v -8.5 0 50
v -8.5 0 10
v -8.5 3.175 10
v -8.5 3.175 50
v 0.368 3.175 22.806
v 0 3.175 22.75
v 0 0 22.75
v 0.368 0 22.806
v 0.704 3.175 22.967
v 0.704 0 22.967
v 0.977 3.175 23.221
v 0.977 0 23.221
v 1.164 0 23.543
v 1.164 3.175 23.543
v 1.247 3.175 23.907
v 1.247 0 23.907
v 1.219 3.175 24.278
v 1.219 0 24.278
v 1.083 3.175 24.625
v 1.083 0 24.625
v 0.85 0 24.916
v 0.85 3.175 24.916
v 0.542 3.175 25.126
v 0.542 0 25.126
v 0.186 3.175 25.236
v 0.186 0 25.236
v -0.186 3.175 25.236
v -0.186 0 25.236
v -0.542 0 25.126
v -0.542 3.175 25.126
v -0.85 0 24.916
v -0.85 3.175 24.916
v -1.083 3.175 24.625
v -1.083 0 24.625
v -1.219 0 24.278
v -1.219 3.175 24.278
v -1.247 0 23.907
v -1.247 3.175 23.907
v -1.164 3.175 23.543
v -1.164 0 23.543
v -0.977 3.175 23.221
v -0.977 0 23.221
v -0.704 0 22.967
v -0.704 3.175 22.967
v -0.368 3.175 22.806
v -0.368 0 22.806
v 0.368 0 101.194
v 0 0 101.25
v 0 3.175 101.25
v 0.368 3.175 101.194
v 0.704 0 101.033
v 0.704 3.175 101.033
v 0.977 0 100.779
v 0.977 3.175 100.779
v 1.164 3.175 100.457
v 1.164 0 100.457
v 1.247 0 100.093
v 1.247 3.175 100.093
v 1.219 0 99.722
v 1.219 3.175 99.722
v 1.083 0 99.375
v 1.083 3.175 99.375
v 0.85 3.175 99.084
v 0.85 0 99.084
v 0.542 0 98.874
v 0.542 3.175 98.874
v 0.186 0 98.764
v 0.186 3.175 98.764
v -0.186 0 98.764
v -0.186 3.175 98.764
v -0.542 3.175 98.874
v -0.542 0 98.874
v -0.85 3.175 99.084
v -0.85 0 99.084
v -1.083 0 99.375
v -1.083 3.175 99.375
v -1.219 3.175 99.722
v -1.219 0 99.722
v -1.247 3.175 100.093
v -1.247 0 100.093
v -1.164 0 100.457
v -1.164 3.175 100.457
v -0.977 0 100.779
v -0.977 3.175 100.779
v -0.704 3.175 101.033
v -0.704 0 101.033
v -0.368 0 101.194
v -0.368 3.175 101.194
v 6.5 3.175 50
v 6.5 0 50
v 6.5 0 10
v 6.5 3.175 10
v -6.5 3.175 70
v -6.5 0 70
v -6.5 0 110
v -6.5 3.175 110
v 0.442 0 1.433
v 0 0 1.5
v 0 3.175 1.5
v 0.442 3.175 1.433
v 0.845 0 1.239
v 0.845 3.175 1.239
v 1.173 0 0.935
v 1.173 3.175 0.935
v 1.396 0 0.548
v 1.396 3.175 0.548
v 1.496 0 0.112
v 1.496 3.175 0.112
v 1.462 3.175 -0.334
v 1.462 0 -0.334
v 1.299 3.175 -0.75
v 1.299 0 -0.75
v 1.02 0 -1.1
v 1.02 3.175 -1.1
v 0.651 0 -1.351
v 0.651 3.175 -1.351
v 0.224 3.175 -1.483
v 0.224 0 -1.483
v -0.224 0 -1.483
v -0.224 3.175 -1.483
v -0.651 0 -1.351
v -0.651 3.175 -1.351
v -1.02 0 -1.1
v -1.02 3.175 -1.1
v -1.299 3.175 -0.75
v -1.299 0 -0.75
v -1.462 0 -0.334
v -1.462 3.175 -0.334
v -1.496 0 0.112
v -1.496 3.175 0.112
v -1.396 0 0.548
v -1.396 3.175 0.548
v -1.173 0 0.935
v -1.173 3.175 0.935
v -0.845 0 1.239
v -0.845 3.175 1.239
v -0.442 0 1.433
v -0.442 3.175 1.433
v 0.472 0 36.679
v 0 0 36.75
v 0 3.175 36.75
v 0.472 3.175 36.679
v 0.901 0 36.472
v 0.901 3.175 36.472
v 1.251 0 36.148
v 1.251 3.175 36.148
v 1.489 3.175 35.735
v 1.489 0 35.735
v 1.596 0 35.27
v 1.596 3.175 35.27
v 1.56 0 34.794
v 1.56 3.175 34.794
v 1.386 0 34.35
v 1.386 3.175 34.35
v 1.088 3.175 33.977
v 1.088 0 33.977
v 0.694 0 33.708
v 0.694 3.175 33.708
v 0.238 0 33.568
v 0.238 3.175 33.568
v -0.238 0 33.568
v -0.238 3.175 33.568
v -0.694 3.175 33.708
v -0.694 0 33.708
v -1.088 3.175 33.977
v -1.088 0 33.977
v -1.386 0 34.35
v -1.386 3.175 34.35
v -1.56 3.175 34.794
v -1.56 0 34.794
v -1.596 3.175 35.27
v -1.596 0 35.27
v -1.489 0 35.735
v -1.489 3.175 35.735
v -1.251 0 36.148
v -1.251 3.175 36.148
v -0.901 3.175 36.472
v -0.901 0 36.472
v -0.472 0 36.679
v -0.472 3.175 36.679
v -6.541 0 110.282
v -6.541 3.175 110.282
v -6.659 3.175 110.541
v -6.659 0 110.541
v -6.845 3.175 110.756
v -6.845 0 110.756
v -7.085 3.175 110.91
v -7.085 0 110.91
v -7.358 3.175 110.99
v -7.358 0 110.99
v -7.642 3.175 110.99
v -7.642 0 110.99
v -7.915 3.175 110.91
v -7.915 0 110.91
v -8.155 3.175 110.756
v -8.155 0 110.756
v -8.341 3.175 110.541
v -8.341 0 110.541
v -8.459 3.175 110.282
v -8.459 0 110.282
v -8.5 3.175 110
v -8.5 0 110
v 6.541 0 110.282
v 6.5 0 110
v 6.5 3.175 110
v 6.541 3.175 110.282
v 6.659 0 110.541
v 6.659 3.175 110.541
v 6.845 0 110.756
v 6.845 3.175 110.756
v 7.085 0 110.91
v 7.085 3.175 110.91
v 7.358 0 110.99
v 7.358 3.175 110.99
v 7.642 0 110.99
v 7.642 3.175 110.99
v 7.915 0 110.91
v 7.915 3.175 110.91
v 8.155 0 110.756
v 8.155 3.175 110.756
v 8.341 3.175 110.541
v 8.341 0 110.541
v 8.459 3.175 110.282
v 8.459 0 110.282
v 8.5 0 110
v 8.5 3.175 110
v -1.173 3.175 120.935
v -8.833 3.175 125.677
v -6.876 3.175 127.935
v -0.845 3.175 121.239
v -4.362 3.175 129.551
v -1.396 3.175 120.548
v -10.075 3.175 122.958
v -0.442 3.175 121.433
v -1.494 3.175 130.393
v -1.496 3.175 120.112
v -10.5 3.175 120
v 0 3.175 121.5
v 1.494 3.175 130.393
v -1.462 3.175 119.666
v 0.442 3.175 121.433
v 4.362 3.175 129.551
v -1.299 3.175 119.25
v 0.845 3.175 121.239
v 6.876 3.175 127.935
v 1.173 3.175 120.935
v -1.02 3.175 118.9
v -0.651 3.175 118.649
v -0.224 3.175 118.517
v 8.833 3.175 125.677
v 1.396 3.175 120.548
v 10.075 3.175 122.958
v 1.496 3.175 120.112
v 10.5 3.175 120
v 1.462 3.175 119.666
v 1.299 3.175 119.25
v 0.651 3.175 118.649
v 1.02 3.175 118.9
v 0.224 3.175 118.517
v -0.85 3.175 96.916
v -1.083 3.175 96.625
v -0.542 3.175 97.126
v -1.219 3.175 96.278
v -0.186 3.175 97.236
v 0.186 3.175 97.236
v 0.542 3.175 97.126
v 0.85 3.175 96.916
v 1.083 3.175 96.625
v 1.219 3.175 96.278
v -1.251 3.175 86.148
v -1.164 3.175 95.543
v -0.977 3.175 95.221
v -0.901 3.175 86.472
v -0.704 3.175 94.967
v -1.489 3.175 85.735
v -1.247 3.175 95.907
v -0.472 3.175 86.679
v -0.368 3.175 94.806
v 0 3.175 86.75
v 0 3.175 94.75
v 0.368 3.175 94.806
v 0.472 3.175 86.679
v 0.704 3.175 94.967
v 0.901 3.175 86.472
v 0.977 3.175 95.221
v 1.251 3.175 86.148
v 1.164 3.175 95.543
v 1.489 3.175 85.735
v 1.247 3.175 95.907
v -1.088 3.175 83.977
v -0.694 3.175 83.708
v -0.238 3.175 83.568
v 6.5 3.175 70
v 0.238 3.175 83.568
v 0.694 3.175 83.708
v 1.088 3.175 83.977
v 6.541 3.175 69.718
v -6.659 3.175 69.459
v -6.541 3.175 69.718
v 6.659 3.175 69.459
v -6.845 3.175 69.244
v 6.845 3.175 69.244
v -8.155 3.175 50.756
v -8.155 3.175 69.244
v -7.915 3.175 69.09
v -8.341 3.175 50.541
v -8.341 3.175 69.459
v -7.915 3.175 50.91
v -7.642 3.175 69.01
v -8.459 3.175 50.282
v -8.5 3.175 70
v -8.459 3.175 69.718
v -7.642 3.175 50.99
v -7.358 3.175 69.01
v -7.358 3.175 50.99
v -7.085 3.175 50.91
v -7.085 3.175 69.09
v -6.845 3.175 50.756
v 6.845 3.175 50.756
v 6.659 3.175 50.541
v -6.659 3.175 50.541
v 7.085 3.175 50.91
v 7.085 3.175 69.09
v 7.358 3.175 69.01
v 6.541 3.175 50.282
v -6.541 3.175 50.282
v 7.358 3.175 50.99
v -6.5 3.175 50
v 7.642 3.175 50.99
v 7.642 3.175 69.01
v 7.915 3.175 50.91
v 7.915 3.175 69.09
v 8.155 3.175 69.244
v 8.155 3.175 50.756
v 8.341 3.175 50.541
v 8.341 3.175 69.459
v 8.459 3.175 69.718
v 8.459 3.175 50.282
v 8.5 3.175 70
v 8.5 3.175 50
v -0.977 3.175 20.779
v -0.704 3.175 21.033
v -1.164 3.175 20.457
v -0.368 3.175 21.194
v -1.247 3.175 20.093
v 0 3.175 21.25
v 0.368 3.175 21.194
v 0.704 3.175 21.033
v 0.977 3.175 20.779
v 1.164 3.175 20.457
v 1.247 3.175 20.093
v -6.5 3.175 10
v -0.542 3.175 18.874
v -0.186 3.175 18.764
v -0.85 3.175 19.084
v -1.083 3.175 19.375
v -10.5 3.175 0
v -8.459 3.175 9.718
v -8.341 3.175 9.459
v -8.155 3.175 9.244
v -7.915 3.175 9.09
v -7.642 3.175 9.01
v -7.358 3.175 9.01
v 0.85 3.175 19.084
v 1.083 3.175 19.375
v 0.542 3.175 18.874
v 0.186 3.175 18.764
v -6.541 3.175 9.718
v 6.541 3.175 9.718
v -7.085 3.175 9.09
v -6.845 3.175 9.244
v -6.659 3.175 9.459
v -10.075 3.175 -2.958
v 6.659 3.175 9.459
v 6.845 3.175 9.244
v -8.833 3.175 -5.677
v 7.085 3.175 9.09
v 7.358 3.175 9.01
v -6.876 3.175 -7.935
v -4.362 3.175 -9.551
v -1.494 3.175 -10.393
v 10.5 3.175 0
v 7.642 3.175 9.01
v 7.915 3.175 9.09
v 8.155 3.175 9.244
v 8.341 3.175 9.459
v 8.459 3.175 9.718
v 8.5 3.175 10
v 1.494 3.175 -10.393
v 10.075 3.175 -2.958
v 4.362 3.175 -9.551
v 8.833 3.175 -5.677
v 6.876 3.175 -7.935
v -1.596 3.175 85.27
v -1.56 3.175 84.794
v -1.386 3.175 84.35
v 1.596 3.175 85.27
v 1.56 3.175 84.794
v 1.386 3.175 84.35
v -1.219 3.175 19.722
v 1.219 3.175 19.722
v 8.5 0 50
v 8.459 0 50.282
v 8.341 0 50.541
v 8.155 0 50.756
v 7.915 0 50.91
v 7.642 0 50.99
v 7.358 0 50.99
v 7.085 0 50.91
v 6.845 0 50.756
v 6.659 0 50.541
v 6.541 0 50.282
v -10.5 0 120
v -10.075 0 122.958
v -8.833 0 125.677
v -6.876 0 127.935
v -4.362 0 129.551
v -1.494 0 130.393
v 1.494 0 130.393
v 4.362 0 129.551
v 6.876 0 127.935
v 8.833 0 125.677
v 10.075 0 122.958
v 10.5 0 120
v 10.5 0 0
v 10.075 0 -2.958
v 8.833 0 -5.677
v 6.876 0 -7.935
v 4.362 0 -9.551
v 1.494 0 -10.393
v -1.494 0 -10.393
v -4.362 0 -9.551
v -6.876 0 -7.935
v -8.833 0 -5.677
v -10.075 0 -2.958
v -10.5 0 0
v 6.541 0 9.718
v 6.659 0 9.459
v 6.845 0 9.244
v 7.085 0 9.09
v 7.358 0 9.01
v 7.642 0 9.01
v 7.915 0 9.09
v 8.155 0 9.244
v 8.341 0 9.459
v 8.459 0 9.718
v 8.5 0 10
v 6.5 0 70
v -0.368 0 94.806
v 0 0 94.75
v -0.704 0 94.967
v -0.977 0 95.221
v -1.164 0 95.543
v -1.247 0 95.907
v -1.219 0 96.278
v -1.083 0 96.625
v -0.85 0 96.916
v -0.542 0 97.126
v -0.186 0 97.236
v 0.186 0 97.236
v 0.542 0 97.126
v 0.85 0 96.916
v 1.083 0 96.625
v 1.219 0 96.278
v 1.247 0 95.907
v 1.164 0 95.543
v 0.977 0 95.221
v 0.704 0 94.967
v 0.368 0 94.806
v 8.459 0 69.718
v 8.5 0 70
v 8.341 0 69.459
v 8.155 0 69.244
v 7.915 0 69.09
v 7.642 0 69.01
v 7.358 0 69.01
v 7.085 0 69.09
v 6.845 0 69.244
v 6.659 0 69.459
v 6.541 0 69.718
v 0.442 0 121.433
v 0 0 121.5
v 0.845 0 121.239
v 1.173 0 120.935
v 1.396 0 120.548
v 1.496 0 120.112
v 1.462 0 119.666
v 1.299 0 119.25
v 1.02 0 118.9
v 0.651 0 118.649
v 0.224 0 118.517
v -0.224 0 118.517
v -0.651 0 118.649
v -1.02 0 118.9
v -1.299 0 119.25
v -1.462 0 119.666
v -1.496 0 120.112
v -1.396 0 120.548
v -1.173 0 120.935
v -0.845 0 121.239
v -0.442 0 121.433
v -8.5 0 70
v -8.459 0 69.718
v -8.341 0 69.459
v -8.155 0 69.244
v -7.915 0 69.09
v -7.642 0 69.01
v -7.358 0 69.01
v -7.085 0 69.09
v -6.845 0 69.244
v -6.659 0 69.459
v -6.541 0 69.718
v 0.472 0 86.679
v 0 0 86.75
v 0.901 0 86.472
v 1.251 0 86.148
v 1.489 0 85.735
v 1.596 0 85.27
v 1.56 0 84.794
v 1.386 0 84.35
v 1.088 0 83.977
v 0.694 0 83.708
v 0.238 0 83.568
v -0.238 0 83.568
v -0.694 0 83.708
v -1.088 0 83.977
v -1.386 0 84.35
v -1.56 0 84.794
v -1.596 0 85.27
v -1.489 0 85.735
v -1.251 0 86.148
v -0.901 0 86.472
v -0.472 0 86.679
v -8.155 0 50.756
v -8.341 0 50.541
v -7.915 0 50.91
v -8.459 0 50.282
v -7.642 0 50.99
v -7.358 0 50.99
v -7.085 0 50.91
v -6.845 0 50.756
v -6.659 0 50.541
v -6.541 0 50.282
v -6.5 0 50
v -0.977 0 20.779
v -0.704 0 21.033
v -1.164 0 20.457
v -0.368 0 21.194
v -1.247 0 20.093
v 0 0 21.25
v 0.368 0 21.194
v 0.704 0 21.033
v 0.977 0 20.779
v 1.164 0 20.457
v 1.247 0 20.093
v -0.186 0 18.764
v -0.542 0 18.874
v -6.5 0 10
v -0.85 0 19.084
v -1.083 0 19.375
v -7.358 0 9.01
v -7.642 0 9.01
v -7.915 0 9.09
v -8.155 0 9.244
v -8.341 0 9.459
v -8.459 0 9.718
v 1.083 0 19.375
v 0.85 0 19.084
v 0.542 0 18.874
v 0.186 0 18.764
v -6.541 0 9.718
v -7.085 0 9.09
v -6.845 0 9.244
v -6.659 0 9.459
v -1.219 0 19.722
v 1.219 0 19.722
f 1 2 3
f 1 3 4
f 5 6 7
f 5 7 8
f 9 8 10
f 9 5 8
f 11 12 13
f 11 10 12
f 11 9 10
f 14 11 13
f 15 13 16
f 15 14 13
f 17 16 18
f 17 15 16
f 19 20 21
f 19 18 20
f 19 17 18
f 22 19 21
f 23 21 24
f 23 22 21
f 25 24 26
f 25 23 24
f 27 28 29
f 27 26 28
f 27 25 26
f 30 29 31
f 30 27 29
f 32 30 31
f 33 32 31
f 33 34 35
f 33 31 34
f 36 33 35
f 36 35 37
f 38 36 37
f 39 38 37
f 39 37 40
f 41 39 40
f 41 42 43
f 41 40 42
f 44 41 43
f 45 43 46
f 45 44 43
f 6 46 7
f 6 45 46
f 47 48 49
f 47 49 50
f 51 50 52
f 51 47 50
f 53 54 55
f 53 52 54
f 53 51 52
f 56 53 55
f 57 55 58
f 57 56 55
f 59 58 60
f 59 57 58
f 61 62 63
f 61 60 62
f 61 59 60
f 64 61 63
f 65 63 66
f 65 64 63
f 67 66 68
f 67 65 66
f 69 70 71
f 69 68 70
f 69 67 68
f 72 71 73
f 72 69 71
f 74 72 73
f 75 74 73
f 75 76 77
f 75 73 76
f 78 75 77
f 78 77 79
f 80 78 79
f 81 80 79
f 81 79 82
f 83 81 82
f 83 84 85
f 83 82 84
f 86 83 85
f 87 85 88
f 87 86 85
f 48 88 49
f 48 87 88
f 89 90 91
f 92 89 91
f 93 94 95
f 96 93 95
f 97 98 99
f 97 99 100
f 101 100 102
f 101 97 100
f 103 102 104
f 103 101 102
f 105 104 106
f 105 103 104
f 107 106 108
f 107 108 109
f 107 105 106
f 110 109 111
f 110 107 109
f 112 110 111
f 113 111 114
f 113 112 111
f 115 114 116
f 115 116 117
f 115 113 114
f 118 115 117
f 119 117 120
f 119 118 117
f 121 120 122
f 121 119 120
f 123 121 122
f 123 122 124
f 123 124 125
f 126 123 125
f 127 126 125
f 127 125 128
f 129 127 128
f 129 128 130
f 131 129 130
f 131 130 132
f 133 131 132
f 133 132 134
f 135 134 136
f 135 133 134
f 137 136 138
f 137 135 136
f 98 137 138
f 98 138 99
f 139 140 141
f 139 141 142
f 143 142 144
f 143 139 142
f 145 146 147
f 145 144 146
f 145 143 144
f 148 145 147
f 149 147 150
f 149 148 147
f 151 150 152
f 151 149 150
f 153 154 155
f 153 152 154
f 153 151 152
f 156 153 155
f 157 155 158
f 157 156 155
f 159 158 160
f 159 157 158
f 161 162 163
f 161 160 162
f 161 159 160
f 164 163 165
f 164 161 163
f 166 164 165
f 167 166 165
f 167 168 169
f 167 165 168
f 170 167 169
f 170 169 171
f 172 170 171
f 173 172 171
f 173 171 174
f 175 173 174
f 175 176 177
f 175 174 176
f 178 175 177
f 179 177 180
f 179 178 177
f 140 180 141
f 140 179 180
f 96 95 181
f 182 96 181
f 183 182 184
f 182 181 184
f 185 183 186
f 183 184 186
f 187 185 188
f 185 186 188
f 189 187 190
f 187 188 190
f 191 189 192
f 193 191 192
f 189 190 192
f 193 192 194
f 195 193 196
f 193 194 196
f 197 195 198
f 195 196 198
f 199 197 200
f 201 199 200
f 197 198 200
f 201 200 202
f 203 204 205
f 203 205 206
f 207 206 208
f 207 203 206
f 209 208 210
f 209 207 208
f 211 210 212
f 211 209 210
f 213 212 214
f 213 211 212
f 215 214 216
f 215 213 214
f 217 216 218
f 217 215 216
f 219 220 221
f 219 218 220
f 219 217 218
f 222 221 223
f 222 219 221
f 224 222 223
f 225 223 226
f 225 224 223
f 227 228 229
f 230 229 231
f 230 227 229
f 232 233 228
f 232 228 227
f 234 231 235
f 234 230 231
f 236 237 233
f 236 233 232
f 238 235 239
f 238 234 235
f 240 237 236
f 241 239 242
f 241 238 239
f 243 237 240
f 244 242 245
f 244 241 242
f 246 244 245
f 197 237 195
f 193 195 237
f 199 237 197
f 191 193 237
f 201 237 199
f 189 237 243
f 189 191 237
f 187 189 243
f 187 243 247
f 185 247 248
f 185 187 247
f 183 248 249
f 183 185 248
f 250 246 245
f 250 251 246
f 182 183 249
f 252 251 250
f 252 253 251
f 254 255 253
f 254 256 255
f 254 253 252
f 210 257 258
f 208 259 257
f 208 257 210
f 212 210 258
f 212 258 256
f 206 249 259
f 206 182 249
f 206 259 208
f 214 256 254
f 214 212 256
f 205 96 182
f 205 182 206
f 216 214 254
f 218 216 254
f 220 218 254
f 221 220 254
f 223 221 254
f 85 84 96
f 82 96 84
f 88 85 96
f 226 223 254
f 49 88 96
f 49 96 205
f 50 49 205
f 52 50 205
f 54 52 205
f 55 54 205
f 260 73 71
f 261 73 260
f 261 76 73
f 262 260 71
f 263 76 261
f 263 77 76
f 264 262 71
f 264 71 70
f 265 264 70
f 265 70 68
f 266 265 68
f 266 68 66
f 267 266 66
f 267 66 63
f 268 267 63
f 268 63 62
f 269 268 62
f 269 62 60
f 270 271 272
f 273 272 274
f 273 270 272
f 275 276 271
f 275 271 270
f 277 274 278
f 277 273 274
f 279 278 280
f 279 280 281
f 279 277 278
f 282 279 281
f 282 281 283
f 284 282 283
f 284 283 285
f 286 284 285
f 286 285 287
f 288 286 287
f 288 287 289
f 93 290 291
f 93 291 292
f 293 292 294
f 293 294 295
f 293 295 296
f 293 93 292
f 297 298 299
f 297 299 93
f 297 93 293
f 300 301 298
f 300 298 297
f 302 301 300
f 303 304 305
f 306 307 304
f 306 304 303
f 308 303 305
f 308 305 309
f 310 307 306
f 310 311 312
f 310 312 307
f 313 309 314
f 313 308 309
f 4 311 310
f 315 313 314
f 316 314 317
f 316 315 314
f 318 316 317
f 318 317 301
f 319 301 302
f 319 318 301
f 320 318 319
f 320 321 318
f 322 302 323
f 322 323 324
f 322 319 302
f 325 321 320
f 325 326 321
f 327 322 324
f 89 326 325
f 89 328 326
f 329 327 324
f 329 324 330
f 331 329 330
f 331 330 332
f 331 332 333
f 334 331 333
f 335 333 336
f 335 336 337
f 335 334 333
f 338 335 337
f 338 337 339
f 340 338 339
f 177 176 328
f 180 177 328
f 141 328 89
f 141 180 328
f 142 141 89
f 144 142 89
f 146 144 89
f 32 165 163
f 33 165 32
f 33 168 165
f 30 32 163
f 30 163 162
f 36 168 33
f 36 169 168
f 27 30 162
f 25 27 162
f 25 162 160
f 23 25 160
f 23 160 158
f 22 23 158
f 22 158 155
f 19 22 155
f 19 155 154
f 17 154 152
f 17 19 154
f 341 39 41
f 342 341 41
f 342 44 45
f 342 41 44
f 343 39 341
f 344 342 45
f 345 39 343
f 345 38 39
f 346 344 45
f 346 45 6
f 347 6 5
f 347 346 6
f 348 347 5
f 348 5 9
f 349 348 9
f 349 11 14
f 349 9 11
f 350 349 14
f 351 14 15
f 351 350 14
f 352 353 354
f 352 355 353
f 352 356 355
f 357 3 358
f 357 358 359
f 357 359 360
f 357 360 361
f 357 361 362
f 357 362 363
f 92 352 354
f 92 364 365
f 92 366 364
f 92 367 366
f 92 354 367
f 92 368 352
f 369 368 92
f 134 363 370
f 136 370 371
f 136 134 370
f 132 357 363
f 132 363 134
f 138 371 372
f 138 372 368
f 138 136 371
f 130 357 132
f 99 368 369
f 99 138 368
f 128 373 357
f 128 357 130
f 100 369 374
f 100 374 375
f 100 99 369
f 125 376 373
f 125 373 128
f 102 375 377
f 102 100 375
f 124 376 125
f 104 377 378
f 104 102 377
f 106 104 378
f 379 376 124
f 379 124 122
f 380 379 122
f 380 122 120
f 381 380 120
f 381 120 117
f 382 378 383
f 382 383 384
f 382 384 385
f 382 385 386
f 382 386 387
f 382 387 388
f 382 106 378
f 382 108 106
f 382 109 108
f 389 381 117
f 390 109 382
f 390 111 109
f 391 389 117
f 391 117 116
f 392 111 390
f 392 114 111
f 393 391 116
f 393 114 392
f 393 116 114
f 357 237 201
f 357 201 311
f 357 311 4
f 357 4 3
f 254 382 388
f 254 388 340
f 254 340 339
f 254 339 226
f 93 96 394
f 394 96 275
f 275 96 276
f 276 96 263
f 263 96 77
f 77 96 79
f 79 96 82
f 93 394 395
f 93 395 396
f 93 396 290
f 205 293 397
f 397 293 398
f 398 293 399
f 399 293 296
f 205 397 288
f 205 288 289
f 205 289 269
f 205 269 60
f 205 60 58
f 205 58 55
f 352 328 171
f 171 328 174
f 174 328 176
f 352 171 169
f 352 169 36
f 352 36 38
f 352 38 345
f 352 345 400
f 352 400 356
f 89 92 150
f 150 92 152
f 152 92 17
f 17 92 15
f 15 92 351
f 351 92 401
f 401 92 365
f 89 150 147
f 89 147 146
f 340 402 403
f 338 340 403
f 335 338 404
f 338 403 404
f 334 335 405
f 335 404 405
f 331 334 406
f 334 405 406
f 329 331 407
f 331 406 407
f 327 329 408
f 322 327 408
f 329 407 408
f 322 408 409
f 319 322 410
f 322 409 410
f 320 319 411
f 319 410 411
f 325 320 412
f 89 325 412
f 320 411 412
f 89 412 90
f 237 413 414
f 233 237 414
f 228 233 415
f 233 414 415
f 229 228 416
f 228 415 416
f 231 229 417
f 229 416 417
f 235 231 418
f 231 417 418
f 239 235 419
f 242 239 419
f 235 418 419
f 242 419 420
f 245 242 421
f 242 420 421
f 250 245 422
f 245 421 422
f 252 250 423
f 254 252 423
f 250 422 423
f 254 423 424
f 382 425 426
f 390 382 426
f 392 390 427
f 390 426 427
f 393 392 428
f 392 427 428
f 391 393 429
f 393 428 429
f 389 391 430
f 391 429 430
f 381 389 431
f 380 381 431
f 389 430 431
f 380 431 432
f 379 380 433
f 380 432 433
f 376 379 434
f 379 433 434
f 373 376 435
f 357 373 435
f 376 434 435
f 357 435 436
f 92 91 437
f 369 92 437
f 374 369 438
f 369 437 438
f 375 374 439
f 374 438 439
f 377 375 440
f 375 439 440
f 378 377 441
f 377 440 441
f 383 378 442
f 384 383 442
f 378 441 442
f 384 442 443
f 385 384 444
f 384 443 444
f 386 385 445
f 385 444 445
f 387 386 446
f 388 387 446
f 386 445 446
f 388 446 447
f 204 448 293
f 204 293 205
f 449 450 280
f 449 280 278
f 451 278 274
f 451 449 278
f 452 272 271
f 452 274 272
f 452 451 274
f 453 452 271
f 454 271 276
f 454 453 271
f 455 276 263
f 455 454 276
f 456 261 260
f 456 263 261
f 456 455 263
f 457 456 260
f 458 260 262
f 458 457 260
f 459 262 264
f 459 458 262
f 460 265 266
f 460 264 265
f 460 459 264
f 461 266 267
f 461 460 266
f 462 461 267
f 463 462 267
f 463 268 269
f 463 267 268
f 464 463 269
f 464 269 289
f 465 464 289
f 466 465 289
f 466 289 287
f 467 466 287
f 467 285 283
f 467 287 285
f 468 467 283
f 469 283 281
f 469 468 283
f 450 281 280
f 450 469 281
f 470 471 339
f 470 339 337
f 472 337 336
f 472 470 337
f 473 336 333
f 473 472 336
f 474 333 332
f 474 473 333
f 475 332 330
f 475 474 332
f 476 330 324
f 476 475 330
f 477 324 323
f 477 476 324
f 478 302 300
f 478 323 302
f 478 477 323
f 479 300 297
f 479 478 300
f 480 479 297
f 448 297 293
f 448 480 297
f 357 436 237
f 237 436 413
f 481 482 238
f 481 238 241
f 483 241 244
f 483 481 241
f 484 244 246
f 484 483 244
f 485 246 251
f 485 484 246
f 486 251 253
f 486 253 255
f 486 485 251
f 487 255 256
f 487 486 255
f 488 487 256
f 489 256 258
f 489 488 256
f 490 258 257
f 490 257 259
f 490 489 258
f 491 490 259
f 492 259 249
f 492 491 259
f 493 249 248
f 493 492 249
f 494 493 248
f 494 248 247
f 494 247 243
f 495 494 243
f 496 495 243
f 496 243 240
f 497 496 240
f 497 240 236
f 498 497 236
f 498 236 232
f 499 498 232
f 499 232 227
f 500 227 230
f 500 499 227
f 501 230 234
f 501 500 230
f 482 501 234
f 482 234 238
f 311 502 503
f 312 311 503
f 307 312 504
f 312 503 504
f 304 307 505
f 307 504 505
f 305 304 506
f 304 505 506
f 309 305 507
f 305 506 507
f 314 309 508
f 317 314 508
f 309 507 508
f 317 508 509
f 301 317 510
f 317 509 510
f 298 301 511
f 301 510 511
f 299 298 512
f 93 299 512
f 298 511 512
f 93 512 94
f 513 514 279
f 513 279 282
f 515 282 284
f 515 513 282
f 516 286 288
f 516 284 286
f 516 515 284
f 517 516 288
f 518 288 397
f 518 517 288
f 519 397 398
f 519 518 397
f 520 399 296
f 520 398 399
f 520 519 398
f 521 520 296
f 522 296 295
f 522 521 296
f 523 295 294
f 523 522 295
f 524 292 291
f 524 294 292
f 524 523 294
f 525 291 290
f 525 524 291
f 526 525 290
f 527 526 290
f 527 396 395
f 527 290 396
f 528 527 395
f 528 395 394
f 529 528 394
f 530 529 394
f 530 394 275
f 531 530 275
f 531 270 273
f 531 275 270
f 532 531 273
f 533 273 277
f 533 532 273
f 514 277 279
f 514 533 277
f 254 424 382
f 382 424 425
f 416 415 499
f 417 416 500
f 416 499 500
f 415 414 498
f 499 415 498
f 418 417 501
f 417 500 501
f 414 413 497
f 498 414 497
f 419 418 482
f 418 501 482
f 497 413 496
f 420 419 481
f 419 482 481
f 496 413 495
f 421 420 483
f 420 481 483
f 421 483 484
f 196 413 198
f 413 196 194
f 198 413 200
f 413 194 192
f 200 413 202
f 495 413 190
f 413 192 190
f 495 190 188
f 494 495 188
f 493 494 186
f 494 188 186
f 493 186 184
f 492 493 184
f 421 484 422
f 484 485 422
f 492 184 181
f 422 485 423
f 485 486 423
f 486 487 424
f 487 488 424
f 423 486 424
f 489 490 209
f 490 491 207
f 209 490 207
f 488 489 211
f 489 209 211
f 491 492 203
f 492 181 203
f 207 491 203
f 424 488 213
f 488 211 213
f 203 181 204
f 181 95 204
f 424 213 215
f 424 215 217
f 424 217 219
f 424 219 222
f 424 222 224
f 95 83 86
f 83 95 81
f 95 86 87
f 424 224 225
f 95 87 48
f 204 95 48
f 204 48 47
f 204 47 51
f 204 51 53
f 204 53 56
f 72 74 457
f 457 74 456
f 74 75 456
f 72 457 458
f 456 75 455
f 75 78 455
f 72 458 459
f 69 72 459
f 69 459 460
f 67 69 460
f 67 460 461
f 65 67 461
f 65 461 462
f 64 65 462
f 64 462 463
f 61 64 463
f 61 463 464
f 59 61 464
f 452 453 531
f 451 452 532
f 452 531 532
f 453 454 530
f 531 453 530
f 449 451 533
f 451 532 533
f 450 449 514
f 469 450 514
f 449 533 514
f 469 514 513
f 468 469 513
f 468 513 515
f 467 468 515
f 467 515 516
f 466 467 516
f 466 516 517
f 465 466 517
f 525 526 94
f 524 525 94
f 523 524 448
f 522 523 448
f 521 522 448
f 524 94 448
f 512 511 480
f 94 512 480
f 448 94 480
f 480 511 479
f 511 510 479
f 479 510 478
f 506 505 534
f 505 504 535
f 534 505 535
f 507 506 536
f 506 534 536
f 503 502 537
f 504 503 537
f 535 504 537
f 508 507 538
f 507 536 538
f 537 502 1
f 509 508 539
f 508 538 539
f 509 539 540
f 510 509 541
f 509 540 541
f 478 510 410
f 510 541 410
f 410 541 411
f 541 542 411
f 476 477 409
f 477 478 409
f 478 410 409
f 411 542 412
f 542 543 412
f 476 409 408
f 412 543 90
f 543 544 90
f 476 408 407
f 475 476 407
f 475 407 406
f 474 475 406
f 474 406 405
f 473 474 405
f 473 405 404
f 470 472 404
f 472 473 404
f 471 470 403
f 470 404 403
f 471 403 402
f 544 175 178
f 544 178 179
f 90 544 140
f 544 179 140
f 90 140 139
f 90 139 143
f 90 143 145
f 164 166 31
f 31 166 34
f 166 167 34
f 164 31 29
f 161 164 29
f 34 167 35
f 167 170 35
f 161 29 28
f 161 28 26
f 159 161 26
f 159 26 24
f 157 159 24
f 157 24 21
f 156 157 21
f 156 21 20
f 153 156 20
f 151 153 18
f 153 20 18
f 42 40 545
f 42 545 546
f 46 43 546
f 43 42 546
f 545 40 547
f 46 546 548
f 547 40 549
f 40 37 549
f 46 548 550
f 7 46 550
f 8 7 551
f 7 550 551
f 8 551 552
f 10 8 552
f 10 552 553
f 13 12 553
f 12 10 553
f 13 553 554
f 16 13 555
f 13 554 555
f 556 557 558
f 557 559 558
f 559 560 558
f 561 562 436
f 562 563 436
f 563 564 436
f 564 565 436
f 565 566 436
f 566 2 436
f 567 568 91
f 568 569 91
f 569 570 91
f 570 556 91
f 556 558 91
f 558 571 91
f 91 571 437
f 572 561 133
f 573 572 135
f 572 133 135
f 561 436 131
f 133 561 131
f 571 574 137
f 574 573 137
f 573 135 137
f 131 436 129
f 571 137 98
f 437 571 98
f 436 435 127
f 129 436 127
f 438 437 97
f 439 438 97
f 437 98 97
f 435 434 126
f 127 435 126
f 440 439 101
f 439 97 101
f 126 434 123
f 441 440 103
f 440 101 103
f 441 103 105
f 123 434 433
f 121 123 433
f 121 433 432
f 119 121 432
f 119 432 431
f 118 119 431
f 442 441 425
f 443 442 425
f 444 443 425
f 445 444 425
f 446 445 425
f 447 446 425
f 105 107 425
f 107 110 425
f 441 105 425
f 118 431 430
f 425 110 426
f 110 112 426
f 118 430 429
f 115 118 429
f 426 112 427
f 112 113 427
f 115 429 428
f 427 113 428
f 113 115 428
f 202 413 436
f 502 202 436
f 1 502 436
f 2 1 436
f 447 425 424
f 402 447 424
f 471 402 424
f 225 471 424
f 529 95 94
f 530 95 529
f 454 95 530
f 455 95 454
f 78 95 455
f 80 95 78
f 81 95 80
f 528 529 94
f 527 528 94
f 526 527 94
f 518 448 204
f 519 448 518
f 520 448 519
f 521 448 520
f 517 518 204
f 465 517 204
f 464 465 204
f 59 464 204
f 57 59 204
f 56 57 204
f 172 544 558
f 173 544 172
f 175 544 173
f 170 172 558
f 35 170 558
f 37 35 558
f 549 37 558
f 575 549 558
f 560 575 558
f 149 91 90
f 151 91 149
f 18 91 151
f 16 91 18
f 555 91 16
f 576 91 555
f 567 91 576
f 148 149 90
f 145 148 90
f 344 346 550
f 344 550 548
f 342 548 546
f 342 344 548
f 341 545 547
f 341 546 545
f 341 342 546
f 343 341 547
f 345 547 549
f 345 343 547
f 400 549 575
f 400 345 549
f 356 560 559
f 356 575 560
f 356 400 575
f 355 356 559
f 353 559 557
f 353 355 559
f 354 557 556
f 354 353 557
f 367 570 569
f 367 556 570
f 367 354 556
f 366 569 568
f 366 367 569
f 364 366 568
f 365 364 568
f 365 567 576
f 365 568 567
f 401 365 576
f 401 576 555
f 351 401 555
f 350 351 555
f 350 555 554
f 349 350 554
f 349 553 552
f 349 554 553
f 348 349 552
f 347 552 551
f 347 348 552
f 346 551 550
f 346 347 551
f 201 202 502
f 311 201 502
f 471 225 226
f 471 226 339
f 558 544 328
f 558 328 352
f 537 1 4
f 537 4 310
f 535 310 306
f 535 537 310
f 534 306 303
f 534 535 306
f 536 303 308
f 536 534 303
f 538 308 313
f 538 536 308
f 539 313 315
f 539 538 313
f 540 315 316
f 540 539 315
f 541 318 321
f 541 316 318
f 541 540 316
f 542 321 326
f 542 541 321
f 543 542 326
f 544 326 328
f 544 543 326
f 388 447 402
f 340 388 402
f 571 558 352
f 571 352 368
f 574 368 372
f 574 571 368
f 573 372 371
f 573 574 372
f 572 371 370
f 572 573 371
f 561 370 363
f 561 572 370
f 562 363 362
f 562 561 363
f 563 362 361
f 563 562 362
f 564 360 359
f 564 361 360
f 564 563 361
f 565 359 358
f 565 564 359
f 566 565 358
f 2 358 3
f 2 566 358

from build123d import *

# Parameters (mm, degrees)
SKETCH1_R               = 1.5
BOSS_EXTRUDE1_DEPTH     = 3.175
CUT_EXTRUDE1_DEPTH      = 131.960225355
CUT_EXTRUDE1_DEPTH_BACK = 131.960225355
CUT_EXTRUDE2_DEPTH      = 131.960225355
CUT_EXTRUDE2_DEPTH_BACK = 131.960225355
CUT_EXTRUDE3_DEPTH      = 131.960225355
CUT_EXTRUDE3_DEPTH_BACK = 131.960225355
SKETCH4_R               = 1.6
CUT_EXTRUDE4_DEPTH      = 40


with BuildPart() as part:
    # Sketch1 → Boss-Extrude1 (new body)
    with BuildSketch(Plane(origin=(0, 0, 0), x_dir=(1, 0, 0), z_dir=(0, 1, 0))):
        with BuildLine():
            Line((-10.5, 0), (-10.5, -120))
            ThreePointArc((-10.5, -120), (0, -130.5), (10.5, -120))
            Line((10.5, -120), (10.5, 0))
            ThreePointArc((10.5, 0), (0, 10.5), (-10.5, 0))
        make_face()
        with Locations(Location((0, 0, 0), (0, 0, 270))):
            Circle(SKETCH1_R, mode=Mode.SUBTRACT)
        with Locations(Location((0, -120, 0), (0, 0, 270))):
            Circle(SKETCH1_R, mode=Mode.SUBTRACT)
    extrude(amount=BOSS_EXTRUDE1_DEPTH)

    # Sketch2 → Cut-Extrude1 (cut, two sides: drawn at the far end of the back side and taken through both)
    with BuildSketch(Plane.XZ.offset(-CUT_EXTRUDE1_DEPTH_BACK)):
        with BuildLine():
            ThreePointArc((0, 18.75), (1.25, 20), (0, 21.25))
            ThreePointArc((0, 21.25), (-1.25, 20), (0, 18.75))
        make_face()
        with BuildLine():
            ThreePointArc((0, 25.25), (-1.25, 24), (0, 22.75))
            ThreePointArc((0, 22.75), (1.25, 24), (0, 25.25))
        make_face()
    extrude(amount=CUT_EXTRUDE1_DEPTH + CUT_EXTRUDE1_DEPTH_BACK, mode=Mode.SUBTRACT)

    # Sketch3 → Cut-Extrude2 (cut, two sides: drawn at the far end of the back side and taken through both)
    with BuildSketch(Plane(origin=(0, 3.175, 0), x_dir=(1, 0, 0), z_dir=(0, 1, 0)).offset(-CUT_EXTRUDE2_DEPTH_BACK)):
        with BuildLine():
            ThreePointArc((0, -97.25), (1.25, -96), (0, -94.75))
            ThreePointArc((0, -94.75), (-1.25, -96), (0, -97.25))
        make_face()
        with BuildLine():
            ThreePointArc((0, -98.75), (-1.25, -100), (0, -101.25))
            ThreePointArc((0, -101.25), (1.25, -100), (0, -98.75))
        make_face()
    extrude(amount=CUT_EXTRUDE2_DEPTH + CUT_EXTRUDE2_DEPTH_BACK, mode=Mode.SUBTRACT)

    # Sketch4 → Cut-Extrude3 (cut, two sides: drawn at the far end of the back side and taken through both)
    with BuildSketch(Plane(origin=(0, 3.175, 0), x_dir=(1, 0, 0), z_dir=(0, 1, 0)).offset(-CUT_EXTRUDE3_DEPTH_BACK)):
        with Locations(Location((0, -35.15, 0), (0, 0, 270))):
            Circle(SKETCH4_R)
        with Locations(Location((0, -85.15, 0), (0, 0, 270))):
            Circle(SKETCH4_R)
    extrude(amount=CUT_EXTRUDE3_DEPTH + CUT_EXTRUDE3_DEPTH_BACK, mode=Mode.SUBTRACT)

    # Sketch5 → Cut-Extrude4 (cut)
    with BuildSketch(Plane.XZ):
        with BuildLine():
            Line((-8.5, 10), (-8.5, 50))
            ThreePointArc((-8.5, 50), (-7.5, 51), (-6.5, 50))
            Line((-6.5, 50), (-6.5, 10))
            ThreePointArc((-6.5, 10), (-7.5, 9), (-8.5, 10))
        make_face()
        with BuildLine():
            Line((6.5, 50), (6.5, 10))
            ThreePointArc((6.5, 10), (7.5, 9), (8.5, 10))
            Line((8.5, 10), (8.5, 50))
            ThreePointArc((8.5, 50), (7.5, 51), (6.5, 50))
        make_face()
        with BuildLine():
            Line((8.5, 110), (8.5, 70))
            ThreePointArc((8.5, 70), (7.5, 69), (6.5, 70))
            Line((6.5, 70), (6.5, 110))
            ThreePointArc((6.5, 110), (7.5, 111), (8.5, 110))
        make_face()
        with BuildLine():
            Line((-6.5, 70), (-6.5, 110))
            ThreePointArc((-6.5, 110), (-7.5, 111), (-8.5, 110))
            Line((-8.5, 110), (-8.5, 70))
            ThreePointArc((-8.5, 70), (-7.5, 69), (-6.5, 70))
        make_face()
    extrude(amount=-CUT_EXTRUDE4_DEPTH, mode=Mode.SUBTRACT)


solid = part.part
